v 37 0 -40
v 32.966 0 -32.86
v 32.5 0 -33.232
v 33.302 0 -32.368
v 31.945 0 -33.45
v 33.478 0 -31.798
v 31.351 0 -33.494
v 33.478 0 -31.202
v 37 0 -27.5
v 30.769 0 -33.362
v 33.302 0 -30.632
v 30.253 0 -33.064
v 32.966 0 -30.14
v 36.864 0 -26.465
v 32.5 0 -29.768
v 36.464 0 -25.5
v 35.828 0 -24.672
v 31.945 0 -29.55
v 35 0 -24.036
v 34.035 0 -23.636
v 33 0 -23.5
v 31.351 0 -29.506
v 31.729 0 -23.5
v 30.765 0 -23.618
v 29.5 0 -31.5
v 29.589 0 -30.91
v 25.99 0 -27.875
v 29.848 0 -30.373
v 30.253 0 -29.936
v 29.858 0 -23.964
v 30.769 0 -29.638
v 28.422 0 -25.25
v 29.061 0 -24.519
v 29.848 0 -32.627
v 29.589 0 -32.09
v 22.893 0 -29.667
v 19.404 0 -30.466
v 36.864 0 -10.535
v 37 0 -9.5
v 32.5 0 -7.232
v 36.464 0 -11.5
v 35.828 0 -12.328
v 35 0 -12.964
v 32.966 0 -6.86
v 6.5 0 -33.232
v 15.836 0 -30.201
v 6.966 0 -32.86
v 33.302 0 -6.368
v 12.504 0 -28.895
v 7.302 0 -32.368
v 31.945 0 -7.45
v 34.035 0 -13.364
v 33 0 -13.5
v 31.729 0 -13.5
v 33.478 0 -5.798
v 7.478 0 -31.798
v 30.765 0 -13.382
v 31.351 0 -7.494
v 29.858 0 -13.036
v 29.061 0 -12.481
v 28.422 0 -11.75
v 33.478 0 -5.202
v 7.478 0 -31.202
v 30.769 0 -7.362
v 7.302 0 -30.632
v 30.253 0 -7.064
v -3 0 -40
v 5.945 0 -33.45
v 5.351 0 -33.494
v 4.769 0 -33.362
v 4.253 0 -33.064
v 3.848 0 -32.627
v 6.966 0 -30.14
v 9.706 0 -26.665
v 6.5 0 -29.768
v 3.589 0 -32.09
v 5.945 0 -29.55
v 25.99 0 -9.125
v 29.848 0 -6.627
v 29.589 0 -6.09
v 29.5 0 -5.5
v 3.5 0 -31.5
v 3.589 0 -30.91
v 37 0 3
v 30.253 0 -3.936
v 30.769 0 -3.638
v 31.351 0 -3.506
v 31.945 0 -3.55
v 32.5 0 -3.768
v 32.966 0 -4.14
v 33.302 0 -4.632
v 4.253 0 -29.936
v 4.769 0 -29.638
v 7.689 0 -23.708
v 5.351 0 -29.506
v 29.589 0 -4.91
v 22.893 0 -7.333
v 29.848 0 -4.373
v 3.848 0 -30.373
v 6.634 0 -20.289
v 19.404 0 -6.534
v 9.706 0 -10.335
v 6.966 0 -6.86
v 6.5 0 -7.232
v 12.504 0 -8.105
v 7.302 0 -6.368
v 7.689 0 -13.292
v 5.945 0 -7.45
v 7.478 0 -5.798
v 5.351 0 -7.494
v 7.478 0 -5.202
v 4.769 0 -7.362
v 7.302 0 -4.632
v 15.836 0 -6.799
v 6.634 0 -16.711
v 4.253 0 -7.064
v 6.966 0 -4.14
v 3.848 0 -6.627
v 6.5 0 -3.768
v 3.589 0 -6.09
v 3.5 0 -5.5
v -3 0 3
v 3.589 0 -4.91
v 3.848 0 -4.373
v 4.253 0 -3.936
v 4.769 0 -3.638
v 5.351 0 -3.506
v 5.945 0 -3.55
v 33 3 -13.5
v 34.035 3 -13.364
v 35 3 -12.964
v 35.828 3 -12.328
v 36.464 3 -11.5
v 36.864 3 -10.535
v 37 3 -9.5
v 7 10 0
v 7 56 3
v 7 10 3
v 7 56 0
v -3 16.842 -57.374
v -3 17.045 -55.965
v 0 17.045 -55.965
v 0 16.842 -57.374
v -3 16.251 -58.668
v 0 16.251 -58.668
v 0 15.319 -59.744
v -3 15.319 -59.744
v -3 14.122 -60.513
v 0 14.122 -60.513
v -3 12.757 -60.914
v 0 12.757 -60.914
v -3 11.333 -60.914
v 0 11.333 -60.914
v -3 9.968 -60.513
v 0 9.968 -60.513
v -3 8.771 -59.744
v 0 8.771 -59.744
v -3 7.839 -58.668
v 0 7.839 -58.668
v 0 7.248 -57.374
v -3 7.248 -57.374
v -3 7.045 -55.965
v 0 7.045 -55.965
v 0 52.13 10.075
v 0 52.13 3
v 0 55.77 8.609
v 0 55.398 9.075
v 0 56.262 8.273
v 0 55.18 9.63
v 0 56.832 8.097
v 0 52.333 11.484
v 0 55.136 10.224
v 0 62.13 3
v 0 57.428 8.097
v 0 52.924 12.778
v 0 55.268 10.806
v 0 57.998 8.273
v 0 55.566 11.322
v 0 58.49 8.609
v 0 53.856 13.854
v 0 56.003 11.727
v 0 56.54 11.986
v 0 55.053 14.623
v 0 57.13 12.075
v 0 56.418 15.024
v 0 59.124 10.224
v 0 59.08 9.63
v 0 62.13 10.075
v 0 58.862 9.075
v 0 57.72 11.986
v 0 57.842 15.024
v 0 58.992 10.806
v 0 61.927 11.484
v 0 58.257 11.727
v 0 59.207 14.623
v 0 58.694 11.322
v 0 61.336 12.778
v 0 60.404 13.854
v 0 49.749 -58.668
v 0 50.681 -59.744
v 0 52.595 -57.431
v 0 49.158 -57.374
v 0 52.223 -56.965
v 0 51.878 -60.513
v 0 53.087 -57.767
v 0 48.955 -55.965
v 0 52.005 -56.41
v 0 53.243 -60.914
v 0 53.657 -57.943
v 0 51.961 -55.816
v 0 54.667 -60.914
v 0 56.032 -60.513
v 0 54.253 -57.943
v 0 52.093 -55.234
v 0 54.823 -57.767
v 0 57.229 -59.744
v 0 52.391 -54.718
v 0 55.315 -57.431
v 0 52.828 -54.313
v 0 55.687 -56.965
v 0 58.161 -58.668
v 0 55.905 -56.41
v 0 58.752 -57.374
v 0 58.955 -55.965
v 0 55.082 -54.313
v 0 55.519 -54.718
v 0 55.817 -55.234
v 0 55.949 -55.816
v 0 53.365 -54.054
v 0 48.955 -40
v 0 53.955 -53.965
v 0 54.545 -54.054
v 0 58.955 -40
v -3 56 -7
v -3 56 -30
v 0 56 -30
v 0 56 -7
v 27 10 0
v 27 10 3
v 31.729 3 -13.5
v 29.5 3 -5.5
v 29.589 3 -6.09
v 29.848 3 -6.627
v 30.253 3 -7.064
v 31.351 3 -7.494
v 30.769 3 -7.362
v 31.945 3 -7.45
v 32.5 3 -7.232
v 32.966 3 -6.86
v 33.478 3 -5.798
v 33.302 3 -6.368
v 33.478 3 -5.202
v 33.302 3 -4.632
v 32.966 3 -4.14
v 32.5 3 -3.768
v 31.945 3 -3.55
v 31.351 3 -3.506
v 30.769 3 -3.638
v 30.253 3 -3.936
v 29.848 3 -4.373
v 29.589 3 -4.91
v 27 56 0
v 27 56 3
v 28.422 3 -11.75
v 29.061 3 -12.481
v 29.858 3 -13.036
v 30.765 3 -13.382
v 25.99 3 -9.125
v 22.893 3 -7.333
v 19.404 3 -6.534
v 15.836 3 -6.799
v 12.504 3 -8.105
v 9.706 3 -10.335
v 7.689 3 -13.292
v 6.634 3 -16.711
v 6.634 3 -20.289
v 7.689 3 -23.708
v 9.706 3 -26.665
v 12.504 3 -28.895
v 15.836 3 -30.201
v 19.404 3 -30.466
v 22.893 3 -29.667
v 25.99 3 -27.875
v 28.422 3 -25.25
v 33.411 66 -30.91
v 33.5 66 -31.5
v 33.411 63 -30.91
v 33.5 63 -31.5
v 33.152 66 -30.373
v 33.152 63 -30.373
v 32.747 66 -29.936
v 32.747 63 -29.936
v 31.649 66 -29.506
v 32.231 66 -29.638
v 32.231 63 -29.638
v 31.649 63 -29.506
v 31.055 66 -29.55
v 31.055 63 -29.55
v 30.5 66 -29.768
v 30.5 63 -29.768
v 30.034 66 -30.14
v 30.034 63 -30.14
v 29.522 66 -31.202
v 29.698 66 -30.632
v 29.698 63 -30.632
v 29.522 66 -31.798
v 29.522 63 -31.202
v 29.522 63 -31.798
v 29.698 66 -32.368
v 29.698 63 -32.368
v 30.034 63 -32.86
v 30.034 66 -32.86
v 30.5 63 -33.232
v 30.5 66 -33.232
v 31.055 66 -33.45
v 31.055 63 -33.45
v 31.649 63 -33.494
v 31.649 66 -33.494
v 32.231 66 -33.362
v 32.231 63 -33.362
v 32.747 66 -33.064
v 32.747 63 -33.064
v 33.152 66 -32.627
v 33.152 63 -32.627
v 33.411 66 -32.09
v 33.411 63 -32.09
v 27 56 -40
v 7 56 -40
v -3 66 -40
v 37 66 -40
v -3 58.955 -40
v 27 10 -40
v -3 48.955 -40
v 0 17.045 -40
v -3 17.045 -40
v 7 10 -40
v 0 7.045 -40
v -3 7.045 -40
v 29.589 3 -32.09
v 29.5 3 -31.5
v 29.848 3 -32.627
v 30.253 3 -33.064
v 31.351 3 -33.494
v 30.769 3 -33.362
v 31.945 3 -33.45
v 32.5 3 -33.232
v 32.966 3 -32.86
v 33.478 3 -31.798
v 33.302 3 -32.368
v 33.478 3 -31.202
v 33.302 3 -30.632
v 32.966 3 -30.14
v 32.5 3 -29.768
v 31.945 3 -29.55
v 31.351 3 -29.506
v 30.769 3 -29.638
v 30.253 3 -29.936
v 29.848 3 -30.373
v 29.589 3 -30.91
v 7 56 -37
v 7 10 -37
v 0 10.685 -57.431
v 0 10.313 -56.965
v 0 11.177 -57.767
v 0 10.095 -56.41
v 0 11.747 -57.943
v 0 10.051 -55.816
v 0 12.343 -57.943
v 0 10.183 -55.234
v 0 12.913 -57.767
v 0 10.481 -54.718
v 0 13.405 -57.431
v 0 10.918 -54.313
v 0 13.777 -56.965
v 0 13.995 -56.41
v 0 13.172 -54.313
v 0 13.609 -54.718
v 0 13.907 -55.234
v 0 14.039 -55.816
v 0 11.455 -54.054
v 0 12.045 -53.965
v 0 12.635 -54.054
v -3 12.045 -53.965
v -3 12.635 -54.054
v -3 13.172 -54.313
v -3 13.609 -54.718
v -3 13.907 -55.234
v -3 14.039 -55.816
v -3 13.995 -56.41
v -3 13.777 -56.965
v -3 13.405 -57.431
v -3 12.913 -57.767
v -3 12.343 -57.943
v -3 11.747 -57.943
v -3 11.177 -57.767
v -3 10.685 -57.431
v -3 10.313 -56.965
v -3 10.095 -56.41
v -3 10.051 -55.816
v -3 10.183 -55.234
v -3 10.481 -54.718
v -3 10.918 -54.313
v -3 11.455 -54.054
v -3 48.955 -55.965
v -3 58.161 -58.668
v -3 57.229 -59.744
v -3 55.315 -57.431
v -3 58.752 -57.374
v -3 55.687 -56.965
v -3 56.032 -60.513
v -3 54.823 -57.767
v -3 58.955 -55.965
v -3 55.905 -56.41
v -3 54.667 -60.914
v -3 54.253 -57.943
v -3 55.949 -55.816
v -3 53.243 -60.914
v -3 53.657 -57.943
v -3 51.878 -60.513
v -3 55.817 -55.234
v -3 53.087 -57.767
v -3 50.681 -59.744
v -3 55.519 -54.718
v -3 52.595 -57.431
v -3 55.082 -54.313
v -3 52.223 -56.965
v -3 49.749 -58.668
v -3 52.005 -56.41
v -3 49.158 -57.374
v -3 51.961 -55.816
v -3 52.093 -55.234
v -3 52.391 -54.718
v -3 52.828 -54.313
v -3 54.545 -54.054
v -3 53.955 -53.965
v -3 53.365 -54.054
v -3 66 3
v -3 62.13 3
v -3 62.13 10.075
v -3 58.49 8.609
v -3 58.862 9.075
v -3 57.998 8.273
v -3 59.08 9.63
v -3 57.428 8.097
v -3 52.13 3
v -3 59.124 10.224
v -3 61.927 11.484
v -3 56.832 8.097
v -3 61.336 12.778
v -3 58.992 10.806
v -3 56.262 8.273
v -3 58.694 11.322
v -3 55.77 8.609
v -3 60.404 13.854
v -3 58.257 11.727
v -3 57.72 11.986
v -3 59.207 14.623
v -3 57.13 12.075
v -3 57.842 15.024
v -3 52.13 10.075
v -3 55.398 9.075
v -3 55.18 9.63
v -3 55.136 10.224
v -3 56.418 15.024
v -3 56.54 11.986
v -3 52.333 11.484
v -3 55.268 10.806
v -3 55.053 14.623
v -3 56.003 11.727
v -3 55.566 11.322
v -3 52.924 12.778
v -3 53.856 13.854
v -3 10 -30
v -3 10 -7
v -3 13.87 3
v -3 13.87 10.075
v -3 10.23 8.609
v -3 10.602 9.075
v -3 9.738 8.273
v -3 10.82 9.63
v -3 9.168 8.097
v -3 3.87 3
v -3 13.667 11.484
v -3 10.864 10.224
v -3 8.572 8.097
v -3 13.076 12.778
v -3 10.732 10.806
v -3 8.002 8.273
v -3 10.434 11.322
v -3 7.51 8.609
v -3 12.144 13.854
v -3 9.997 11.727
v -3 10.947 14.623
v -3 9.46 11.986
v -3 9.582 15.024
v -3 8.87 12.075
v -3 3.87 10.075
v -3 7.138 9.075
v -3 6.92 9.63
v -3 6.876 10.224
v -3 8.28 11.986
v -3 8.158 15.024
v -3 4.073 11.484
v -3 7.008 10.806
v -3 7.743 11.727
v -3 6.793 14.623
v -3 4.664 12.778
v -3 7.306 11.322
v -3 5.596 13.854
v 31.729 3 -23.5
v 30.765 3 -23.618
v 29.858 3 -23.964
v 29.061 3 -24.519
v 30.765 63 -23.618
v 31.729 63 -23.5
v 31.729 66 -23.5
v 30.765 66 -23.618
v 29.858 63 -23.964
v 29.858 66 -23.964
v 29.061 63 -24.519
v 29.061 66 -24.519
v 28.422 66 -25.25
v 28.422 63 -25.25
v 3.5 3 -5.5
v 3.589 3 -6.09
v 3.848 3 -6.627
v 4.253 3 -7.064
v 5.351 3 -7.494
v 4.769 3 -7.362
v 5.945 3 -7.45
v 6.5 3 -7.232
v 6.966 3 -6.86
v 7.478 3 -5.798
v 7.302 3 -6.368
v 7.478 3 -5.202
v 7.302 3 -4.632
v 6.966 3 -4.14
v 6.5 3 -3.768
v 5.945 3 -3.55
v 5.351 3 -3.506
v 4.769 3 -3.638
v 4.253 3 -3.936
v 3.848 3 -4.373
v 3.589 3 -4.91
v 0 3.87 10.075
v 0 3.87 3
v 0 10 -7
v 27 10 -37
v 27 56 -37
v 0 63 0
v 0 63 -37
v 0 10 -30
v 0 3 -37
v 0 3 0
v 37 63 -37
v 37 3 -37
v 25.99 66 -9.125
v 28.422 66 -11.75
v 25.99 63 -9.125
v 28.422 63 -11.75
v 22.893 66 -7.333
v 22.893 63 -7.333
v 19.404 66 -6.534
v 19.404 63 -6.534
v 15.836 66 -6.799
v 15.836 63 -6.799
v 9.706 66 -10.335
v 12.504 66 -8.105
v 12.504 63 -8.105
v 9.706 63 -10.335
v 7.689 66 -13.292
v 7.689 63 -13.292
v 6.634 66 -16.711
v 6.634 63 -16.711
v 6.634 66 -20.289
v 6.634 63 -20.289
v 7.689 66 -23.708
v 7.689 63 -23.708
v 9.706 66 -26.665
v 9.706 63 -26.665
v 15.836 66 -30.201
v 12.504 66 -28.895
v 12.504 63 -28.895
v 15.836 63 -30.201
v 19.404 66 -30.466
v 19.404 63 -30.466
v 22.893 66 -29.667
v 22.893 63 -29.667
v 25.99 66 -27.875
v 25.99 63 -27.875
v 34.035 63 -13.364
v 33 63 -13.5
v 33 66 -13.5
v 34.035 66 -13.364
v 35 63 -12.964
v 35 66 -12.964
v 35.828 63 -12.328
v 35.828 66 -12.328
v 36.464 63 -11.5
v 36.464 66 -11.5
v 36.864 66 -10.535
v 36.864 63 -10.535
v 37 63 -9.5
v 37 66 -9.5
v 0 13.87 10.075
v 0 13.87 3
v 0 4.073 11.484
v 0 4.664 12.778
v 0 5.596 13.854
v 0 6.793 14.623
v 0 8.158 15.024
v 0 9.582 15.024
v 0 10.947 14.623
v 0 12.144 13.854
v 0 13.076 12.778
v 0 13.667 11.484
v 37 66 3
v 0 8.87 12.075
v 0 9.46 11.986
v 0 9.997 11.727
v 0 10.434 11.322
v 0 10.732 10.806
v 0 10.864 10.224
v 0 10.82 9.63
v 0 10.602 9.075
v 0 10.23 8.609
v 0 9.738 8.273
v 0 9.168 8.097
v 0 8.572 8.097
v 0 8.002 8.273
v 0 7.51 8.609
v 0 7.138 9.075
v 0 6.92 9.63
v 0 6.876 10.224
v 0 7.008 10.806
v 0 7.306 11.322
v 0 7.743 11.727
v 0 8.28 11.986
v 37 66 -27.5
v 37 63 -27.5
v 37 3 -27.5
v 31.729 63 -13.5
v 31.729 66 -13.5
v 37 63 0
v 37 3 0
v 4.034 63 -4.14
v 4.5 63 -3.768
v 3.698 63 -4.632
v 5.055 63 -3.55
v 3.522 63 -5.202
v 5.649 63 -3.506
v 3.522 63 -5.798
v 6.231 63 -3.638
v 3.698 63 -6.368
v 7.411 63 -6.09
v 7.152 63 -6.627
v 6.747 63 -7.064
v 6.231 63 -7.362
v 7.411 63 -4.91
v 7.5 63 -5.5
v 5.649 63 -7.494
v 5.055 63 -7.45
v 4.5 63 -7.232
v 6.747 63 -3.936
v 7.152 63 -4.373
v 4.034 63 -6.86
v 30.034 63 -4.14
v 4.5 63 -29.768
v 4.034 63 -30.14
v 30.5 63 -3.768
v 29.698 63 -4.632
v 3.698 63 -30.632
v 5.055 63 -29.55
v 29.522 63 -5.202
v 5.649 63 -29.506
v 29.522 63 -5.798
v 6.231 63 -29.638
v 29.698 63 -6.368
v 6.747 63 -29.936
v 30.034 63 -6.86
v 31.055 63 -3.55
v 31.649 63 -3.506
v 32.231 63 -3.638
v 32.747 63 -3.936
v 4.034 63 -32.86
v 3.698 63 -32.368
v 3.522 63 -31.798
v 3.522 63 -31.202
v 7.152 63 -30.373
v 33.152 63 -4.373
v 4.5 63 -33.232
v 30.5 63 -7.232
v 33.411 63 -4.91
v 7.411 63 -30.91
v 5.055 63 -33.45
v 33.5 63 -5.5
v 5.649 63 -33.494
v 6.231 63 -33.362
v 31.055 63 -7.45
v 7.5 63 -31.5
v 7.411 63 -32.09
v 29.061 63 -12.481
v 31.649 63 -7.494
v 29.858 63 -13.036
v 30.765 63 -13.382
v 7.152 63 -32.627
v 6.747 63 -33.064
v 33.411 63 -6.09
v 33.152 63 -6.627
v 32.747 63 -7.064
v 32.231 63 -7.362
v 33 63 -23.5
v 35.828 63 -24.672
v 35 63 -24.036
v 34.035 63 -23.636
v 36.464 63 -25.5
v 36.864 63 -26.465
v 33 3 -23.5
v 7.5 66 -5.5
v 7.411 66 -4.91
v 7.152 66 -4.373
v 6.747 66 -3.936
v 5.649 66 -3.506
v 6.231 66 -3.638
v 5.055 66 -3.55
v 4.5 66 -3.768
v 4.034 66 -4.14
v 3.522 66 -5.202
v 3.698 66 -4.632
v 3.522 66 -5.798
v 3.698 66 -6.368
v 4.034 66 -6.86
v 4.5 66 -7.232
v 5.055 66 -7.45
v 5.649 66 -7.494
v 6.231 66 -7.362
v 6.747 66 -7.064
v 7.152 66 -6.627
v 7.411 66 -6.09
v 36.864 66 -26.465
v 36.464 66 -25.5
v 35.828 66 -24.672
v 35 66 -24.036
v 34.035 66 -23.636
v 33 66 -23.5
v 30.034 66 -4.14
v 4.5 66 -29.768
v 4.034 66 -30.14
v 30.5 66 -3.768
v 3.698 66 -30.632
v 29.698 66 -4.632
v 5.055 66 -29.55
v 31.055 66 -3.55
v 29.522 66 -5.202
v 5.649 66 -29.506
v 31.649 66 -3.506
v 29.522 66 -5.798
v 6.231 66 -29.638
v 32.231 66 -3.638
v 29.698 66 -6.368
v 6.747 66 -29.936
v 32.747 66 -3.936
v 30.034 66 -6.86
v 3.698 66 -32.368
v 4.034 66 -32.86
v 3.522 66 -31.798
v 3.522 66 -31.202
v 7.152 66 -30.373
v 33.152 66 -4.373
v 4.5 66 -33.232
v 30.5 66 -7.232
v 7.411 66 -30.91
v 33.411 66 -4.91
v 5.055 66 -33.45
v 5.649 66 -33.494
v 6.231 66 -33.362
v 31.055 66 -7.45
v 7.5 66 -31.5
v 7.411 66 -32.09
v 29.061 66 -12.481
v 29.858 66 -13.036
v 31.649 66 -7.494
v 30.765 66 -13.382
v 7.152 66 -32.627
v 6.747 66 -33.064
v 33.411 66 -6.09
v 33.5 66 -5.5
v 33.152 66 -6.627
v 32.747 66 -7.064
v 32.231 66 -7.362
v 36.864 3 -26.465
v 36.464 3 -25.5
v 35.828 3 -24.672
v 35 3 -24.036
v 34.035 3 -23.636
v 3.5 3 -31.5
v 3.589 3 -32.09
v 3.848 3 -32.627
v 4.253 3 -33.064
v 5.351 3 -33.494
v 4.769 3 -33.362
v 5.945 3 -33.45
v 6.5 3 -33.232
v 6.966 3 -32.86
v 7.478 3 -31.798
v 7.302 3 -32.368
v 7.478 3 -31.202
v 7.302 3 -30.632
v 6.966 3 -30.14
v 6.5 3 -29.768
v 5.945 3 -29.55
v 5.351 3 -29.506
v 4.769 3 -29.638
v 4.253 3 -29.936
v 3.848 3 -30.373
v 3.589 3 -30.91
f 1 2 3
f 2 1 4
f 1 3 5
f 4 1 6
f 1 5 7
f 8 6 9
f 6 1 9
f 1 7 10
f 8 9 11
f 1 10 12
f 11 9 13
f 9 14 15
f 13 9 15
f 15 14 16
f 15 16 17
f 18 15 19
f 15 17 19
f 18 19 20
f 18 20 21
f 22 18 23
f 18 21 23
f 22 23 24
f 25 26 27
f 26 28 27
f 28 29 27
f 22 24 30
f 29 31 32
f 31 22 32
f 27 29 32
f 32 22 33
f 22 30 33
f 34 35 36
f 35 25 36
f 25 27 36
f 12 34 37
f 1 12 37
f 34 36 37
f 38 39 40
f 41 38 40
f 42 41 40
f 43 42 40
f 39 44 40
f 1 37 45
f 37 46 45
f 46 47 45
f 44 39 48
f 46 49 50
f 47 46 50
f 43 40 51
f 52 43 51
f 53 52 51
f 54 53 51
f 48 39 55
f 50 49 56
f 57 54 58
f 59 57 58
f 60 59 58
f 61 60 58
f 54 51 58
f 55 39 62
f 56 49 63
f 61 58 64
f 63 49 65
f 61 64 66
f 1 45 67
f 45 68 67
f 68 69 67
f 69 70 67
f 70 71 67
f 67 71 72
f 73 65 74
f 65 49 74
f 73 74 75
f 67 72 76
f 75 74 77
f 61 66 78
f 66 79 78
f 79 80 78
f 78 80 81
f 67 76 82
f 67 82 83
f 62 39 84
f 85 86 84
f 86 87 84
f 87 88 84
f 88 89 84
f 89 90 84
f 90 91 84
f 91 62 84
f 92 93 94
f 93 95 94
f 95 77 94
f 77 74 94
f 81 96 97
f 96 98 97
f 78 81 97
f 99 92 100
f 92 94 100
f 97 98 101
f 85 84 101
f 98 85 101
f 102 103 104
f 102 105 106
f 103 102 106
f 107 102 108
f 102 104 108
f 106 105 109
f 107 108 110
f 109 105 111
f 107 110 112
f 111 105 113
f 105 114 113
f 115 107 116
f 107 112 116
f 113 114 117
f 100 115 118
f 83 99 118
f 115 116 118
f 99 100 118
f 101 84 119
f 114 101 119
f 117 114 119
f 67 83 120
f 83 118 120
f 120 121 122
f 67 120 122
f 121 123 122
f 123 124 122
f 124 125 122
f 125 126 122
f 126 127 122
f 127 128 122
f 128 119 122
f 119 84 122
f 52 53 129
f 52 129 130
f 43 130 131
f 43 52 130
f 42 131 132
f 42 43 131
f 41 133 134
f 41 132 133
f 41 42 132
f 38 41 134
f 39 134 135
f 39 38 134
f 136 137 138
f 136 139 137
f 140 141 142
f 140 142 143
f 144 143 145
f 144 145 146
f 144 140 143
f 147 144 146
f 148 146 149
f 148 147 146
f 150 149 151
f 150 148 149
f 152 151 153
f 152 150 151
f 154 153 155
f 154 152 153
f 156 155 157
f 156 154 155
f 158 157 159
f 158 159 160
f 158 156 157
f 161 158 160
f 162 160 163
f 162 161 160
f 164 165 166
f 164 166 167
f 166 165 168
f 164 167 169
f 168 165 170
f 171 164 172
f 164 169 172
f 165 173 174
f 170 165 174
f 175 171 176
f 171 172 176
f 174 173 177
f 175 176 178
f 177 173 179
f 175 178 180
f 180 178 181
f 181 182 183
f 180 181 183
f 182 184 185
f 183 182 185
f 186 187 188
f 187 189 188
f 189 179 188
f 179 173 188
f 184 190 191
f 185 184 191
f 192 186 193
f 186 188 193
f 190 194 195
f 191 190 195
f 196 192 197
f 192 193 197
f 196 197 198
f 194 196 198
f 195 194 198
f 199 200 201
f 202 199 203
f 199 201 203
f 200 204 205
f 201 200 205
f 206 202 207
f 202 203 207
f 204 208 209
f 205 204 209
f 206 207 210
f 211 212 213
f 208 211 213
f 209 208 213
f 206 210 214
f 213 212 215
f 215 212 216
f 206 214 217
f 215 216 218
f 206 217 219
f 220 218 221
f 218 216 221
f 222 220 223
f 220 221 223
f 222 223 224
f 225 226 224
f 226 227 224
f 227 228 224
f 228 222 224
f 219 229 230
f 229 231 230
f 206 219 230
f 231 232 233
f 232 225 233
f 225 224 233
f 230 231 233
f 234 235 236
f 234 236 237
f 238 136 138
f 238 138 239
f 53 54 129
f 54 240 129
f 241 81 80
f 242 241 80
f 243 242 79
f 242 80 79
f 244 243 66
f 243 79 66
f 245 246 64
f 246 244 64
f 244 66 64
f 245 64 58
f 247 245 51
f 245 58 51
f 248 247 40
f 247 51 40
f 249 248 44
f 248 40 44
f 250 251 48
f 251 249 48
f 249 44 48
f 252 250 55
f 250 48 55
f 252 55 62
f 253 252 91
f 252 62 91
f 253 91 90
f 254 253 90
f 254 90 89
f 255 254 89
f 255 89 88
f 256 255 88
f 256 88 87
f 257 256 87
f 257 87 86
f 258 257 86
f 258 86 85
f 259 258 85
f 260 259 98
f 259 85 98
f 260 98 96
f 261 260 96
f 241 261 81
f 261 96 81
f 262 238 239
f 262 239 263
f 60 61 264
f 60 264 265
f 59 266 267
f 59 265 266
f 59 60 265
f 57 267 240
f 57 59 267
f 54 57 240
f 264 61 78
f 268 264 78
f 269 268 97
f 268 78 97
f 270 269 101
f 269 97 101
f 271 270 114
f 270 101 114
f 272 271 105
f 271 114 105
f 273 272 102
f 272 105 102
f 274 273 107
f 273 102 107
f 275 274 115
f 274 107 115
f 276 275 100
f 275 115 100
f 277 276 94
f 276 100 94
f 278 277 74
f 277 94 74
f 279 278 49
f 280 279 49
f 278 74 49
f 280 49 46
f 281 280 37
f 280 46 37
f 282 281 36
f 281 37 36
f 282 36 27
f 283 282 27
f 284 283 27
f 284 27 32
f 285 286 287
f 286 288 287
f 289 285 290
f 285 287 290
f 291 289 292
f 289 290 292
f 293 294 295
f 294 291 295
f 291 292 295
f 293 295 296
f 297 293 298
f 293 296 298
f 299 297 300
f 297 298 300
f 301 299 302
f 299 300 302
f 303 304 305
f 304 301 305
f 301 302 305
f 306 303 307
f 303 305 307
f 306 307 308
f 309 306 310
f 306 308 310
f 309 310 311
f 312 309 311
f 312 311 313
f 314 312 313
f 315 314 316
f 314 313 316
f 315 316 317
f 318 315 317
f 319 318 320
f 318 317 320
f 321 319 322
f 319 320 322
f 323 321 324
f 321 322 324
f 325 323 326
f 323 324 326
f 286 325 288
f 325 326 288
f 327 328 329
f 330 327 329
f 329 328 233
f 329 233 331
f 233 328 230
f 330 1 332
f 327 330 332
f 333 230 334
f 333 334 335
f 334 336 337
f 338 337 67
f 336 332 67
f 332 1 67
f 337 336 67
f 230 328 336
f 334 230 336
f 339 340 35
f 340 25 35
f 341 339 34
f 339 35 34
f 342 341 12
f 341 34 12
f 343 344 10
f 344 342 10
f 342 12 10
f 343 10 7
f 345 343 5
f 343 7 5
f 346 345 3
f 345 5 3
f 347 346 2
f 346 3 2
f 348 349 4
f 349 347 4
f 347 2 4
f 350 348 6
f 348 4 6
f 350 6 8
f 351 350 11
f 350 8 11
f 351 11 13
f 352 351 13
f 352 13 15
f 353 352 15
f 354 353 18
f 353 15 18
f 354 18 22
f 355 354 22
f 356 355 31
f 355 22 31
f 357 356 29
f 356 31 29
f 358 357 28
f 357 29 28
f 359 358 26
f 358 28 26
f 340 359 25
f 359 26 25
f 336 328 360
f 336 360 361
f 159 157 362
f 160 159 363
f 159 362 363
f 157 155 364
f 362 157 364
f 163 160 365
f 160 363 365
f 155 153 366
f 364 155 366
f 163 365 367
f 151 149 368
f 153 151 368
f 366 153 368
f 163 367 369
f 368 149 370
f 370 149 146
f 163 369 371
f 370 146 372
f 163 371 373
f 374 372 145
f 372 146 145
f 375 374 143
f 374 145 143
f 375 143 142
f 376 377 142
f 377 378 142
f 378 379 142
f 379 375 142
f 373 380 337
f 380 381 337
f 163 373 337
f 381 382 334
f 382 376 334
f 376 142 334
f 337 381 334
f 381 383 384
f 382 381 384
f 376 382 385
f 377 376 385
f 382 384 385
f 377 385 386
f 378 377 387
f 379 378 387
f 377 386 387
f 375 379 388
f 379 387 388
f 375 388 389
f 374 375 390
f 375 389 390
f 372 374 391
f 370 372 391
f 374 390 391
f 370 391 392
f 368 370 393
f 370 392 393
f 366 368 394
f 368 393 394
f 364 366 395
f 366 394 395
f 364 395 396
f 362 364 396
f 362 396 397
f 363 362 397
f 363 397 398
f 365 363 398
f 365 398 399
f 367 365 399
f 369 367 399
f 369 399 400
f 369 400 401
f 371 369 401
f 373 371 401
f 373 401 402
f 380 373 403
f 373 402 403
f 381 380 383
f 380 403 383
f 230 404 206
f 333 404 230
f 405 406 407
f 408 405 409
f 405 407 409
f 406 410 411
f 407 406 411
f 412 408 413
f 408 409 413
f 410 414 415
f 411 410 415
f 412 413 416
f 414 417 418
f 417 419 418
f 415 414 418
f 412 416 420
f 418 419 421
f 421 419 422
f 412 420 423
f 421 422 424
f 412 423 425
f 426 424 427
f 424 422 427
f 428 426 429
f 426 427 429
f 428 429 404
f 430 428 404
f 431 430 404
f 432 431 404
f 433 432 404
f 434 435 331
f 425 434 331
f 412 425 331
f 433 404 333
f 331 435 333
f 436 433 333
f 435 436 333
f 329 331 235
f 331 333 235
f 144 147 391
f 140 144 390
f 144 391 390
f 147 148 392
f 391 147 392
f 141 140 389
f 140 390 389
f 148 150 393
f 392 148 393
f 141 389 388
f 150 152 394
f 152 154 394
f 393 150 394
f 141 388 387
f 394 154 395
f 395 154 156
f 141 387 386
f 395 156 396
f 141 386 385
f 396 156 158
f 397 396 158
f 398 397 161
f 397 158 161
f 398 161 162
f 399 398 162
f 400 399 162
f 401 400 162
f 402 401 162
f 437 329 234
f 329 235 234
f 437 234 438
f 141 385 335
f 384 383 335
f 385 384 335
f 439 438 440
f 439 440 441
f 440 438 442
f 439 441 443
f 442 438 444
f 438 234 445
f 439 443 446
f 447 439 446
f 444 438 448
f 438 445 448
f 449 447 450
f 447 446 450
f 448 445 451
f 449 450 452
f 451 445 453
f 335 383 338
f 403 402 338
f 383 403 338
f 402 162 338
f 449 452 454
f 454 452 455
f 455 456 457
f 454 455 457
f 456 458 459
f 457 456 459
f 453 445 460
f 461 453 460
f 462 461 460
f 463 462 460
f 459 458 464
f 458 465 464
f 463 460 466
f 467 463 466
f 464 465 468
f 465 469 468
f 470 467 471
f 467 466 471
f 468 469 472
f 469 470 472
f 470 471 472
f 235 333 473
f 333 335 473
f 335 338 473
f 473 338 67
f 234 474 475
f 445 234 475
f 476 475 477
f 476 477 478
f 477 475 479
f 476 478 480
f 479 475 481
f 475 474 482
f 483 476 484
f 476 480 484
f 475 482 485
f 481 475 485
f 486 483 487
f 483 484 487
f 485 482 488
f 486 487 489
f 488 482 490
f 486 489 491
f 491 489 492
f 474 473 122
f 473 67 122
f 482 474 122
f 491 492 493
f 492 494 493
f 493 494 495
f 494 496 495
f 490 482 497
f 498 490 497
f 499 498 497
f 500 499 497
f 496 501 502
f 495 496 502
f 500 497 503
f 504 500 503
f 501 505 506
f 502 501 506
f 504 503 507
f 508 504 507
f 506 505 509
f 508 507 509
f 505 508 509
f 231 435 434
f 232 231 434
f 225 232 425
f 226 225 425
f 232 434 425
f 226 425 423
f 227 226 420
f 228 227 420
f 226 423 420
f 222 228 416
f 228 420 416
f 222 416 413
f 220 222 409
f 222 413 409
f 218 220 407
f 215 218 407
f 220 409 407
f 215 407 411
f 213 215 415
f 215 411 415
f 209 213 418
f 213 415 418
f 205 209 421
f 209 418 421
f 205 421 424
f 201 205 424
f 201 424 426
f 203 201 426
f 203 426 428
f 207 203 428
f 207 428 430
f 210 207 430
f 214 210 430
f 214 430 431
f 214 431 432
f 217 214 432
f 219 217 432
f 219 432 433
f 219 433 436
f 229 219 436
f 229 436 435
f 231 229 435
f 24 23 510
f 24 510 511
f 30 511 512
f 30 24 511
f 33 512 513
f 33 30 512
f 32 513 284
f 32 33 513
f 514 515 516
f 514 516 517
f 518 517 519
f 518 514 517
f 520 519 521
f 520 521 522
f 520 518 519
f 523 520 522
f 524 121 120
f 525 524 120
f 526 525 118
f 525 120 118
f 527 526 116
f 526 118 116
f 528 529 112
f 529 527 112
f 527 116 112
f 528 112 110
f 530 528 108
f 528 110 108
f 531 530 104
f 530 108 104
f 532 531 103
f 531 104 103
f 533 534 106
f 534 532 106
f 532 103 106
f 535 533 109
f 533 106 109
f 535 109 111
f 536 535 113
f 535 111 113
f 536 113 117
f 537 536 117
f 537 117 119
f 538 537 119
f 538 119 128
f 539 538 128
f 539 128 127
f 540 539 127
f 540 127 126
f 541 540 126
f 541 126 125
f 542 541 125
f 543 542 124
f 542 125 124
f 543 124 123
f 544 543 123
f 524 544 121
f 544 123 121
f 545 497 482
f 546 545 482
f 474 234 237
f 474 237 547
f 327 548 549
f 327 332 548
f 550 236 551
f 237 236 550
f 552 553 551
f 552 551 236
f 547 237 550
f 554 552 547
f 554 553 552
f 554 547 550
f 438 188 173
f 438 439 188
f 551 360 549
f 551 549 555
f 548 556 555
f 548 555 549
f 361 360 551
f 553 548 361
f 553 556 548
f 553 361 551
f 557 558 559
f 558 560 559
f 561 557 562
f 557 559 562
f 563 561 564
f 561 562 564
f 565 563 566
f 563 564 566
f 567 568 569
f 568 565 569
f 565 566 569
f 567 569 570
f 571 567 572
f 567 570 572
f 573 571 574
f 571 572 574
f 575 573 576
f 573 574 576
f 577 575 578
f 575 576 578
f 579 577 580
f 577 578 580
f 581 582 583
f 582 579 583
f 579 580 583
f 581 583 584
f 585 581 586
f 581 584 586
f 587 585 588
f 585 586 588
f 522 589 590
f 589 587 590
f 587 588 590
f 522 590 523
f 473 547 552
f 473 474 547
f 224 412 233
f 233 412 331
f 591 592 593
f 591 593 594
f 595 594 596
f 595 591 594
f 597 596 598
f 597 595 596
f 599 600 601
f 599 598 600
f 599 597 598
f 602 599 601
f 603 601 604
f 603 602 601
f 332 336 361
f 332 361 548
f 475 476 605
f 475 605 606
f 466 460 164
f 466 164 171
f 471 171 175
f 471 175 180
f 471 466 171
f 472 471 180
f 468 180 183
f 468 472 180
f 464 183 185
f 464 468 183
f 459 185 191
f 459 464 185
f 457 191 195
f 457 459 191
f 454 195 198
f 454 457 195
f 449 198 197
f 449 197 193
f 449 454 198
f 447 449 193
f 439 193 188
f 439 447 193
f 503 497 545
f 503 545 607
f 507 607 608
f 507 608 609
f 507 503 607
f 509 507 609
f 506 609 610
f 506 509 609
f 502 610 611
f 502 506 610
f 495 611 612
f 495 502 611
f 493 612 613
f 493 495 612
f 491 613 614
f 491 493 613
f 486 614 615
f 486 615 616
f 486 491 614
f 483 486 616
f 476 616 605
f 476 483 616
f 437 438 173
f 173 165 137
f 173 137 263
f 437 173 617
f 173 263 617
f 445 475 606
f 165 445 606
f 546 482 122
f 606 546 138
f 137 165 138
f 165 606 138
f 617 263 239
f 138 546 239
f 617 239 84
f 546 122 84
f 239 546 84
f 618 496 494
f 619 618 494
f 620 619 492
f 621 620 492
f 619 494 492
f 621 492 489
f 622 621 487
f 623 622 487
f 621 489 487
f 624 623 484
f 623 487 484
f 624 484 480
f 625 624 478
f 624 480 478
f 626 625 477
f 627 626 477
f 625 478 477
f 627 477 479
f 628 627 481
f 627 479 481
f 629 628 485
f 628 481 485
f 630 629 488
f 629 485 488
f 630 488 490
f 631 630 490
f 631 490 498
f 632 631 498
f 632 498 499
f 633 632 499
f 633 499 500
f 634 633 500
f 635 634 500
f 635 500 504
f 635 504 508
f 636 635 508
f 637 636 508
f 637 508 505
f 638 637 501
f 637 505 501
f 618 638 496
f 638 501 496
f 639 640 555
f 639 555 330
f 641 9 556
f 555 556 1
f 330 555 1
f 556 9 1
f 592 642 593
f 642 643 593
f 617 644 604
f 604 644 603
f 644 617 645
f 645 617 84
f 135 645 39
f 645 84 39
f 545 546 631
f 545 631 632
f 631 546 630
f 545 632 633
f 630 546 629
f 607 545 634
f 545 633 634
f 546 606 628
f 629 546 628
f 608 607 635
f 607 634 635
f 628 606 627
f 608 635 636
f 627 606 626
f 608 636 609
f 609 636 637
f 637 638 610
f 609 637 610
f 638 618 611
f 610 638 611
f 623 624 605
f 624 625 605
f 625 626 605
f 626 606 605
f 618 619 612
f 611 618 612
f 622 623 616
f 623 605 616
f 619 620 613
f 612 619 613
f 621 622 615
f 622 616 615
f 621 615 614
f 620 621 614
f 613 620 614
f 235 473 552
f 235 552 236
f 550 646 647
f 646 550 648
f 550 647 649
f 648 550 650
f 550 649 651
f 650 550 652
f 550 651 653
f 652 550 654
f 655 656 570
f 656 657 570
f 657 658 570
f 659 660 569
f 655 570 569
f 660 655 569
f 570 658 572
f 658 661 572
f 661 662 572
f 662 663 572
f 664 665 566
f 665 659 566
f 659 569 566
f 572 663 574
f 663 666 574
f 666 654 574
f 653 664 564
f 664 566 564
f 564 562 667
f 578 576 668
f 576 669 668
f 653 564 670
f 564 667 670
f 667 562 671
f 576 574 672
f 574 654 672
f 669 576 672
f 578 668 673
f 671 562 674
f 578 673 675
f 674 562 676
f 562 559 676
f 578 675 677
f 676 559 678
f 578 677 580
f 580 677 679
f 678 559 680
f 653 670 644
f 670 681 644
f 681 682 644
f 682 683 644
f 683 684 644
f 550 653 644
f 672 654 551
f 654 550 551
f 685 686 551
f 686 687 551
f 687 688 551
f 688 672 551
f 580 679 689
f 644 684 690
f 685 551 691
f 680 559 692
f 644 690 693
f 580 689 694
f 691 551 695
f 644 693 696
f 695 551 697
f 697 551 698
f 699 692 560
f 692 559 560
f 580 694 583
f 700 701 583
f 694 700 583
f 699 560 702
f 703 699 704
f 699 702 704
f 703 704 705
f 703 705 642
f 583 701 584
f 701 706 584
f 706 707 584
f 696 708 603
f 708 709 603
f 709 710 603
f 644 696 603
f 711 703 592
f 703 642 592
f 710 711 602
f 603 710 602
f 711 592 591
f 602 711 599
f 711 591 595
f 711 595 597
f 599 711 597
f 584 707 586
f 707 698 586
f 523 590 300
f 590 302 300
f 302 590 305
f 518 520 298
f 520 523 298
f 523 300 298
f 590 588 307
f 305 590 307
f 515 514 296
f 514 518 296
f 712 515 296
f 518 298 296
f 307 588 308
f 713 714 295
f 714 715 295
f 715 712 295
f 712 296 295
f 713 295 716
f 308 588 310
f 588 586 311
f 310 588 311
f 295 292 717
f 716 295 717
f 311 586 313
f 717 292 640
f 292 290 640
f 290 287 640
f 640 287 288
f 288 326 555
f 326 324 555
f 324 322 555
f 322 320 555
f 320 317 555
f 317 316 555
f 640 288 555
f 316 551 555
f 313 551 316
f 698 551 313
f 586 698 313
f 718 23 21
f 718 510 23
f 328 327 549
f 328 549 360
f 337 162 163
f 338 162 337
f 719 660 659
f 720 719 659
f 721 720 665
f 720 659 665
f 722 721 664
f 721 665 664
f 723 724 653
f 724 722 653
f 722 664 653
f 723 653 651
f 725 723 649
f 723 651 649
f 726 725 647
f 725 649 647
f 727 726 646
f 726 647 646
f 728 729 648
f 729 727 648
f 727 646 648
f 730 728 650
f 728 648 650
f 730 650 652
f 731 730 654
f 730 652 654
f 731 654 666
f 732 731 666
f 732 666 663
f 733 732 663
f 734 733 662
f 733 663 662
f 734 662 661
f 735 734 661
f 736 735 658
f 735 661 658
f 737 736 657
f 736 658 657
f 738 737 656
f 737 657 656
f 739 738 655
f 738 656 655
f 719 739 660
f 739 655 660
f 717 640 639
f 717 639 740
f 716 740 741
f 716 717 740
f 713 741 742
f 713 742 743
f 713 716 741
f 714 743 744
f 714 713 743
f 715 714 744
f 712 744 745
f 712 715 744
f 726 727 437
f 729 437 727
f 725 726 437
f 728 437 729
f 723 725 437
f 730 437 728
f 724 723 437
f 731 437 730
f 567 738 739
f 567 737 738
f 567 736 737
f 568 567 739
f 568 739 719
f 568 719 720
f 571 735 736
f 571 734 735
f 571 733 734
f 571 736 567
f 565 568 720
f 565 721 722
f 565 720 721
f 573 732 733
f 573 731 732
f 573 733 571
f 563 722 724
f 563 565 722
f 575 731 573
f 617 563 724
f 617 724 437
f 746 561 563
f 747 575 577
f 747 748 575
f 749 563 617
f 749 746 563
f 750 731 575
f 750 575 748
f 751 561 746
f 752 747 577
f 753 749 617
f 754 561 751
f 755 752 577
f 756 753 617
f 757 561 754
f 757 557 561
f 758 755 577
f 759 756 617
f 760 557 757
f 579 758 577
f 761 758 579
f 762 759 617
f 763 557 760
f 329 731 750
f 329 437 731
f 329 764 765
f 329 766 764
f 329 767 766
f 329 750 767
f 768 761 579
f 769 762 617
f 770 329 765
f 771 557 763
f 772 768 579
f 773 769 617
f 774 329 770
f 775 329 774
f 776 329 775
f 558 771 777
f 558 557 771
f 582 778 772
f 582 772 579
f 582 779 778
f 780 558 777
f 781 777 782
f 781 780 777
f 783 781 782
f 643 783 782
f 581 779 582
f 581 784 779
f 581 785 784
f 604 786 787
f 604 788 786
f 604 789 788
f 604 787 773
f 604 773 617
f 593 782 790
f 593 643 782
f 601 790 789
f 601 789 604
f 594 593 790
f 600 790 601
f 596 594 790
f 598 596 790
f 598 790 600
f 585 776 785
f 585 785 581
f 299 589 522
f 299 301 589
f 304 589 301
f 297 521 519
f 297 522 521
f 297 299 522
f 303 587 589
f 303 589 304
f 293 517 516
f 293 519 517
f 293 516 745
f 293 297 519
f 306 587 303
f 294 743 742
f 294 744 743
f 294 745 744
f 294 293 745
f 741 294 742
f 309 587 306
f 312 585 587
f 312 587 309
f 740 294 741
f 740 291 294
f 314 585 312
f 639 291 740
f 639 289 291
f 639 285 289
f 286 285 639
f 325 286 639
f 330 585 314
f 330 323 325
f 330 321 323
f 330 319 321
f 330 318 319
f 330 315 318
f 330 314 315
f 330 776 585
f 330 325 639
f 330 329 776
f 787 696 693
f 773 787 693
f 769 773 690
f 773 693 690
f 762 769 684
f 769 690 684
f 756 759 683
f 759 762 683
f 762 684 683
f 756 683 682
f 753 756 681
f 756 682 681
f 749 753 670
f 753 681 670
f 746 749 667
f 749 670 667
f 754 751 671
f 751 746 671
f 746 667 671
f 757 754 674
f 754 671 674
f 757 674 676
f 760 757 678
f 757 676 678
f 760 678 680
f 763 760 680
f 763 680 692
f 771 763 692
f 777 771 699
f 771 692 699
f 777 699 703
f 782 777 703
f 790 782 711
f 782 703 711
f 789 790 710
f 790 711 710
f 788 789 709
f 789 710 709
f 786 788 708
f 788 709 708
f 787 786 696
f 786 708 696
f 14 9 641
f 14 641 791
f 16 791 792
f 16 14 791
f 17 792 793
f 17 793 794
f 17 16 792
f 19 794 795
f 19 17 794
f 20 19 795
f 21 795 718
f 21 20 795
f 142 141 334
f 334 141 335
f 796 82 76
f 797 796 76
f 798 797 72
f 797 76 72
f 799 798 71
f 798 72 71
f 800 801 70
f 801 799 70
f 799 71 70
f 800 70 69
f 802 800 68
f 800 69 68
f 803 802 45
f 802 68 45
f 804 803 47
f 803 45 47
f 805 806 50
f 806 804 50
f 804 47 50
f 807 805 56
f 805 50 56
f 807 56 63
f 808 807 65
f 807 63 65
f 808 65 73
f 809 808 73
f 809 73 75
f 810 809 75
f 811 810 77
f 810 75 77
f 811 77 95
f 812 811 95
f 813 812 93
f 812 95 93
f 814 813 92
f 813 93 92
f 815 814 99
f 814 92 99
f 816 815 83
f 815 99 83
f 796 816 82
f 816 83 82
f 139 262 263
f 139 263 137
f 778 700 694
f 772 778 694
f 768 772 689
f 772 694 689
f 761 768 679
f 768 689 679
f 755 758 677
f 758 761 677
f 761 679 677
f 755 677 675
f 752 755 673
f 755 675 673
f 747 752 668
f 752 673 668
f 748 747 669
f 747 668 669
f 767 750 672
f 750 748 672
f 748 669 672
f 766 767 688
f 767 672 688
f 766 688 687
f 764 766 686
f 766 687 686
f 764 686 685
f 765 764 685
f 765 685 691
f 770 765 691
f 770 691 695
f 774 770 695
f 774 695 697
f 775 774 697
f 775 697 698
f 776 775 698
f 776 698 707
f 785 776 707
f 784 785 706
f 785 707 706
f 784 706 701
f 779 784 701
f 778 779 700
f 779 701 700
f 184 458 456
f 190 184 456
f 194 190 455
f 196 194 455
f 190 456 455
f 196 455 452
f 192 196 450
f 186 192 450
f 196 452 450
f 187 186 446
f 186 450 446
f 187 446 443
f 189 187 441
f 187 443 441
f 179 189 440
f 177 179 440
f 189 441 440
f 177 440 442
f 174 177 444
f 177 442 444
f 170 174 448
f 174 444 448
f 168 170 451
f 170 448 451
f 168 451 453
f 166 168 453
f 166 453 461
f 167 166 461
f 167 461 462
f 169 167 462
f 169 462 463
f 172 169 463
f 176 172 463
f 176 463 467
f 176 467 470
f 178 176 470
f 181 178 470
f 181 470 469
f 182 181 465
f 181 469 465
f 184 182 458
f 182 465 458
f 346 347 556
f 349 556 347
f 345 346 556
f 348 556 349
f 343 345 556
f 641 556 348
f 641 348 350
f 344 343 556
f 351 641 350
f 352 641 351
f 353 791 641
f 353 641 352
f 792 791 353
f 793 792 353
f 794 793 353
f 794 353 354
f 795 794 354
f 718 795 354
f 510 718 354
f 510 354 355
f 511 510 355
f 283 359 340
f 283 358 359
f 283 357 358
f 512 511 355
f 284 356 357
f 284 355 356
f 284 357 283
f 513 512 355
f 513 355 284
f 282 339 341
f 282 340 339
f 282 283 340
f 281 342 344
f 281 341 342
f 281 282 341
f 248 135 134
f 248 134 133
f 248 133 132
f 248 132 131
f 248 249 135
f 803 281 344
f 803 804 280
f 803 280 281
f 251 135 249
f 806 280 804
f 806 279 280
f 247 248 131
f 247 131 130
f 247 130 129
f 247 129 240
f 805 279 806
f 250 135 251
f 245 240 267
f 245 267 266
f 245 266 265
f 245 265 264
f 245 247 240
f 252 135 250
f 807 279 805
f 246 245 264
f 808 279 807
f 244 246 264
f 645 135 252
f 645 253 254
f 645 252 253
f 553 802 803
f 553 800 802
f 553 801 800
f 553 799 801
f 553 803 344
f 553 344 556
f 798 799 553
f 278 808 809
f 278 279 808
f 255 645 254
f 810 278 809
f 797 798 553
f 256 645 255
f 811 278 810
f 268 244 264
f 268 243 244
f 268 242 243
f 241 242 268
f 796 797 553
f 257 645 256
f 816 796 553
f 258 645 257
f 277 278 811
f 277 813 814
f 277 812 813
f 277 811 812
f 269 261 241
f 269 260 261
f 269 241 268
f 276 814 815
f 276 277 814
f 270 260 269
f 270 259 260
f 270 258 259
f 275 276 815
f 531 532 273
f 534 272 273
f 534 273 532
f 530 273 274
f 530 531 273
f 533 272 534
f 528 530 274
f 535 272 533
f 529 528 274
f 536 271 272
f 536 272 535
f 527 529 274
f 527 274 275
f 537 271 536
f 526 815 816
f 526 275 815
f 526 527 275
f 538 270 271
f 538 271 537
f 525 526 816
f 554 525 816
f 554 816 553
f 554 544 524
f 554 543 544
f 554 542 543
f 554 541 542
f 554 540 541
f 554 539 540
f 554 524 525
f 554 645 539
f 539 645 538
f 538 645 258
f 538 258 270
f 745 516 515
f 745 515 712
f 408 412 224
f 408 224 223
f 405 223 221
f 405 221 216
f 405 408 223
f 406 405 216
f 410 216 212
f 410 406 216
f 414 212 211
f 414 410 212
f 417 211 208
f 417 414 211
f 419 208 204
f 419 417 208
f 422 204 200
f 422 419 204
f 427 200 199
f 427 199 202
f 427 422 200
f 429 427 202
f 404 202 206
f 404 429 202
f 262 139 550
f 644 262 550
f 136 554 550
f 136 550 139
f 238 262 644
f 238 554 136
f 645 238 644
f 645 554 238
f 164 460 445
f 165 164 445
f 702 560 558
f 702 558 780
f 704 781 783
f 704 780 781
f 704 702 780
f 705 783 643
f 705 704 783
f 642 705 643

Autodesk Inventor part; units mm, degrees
ref_plane "YZ Plane" through (0, 0, 0) normal (1, 0, 0) x (0, 1, 0)
ref_plane "XZ Plane" through (0, 0, 0) normal (0, 1, 0) x (-1, 0, 0)
ref_plane "XY Plane" through (0, 0, 0) normal (0, 0, 1) x (1, 0, 0)
sketch "Sketch1" plane through (0, 0, 0) normal (0, 1, 0) x (-1, 0, 0)
  line L0 (0, 0) -> (-37, 0)
  line L1 (-37, 0) -> (-37, -37)
  line L2 (-37, -37) -> (0, -37)
  line L3 (0, -37) -> (0, 0)
  circle A0 centre (-5.5, -5.5) radius 2
  circle A1 centre (-5.5, -31.5) radius 2
  circle A2 centre (-31.5, -5.5) radius 2
  circle A3 centre (-31.5, -31.5) radius 2
  circle A4 centre (-18.5, -18.5) radius 12
  dimension "d10" = 24
extrude "Extrusion1" add sketch "Sketch1" along normal blind 3
sketch "Sketch2" plane through (0, 3, 0) normal (0, 1, 0) x (1, 0, 0)
  circle A0 centre (18.5, 18.5) radius 12
  circle A1 centre (31.5, 31.5) radius 2
  circle A2 centre (31.5, 5.5) radius 2
  circle A3 centre (5.5, 31.5) radius 2
  circle A4 centre (5.5, 5.5) radius 2
  line L0 (0, 0) -> (37, 0)
  line L1 (37, 37) -> (0, 37)
  line L2 (0, 37) -> (0, 0)
  line L3 (-3, -3) -> (37, -3)
  line L4 (37, 40) -> (-3, 40)
  line L5 (-3, 40) -> (-3, -3)
  line L6 (37, -3) -> (37, 0)
  line L7 (37, 37) -> (37, 40)
  dimension "d13" = 3
extrude "Extrusion2" add sketch "Sketch2" along normal blind 60 and the other way blind 3 contours L0 L6 L3 L5 L4 L7 L1 L2
sketch "Sketch4" plane through (0, 63, 0) normal (0, 1, 0) x (1, 0, 0)
  circle A0 centre (18.5, 18.5) radius 12 projected
  circle A1 centre (31.5, 31.5) radius 2 projected
  circle A2 centre (31.5, 5.5) radius 2 projected
  circle A3 centre (5.5, 31.5) radius 2 projected
  circle A4 centre (5.5, 5.5) radius 2 projected
  line L0 (0, 0) -> (37, 0) projected
  line L1 (37, 0) -> (37, 37) projected
  line L2 (37, 37) -> (0, 37) projected
  line L3 (0, 37) -> (0, 0) projected
  line L4 (37, 0) -> (0, 0) projected
  line L5 (0, 0) -> (0, 37) projected
  line L6 (0, 37) -> (37, 37) projected
  line L7 (37, 37) -> (37, 40) projected
  line L8 (37, 40) -> (-3, 40) projected
  line L9 (-3, 40) -> (-3, -3) projected
  line L10 (-3, -3) -> (37, -3) projected
  line L11 (37, -3) -> (37, 0) projected
extrude "Extrusion3" add sketch "Sketch4" along normal blind 3
sketch "Sketch5" plane through (0, 66, 0) normal (0, 1, 0) x (1, 0, 0)
  arc A0 (29.4087, 13.5) -> (29.4087, 23.5) centre (18.5, 18.5) ccw
  circle A1 centre (5.5, 5.5) radius 2
  circle A2 centre (5.5, 31.5) radius 2
  circle A3 centre (31.5, 5.5) radius 2
  circle A4 centre (31.5, 31.5) radius 2
  line L0 (37, 13.5) -> (37, 23.5)
  line L1 (37, 40) -> (-3, 40)
  line L2 (-3, 40) -> (-3, -3)
  line L3 (-3, -3) -> (37, -3)
  arc A5 (29.4087, 13.5) -> (29.4087, 23.5) centre (18.5, 18.5) ccw
  line L4 (37, 23.5) -> (37, 13.5)
  line L5 (29.4087, 23.5) -> (37, 23.5)
  line L6 (29.4087, 13.5) -> (37, 13.5)
  point P0 (0, 0)
extrude "Extrusion4" cut sketch "Sketch5" against normal up to surface (66 mm away) contours A0 L5 L0 L6
fillet "Fillet1" radius 4 8 edges at (29.4087, 64.5, -13.5) (37, 64.5, -13.5) (37, 64.5, -23.5) (29.4087, 64.5, -23.5) (37, 1.5, -13.5) (29.4087, 1.5, -13.5) (37, 1.5, -23.5) (29.4087, 1.5, -23.5)
sketch "Sketch7" plane through (37, 0, -40) normal (0, 0, -1) x (-1, 0, 0)
  line L0 (40, 66) -> (40, 0) projected
  line L1 (0, 66) -> (40, 66) projected
  line L2 (0, 66) -> (0, 0) projected
  line L3 (40, 0) -> (0, 0) projected
  line L4 (30, 56) -> (30, 10)
  line L5 (30, 10) -> (10, 10)
  line L6 (10, 10) -> (10, 56)
  line L7 (10, 56) -> (30, 56)
  point P0 (37, 0)
  dimension "d26" = 10
extrude "Extrusion5" cut sketch "Sketch7" against normal up to surface (43 mm away) contours L4 L5 L6 L7
sketch "Sketch8" plane through (-3, 0, -40) normal (-1, 0, 0) x (0, 0, 1)
  line L0 (43, 66) -> (43, 0) projected
  line L1 (0, 66) -> (43, 66) projected
  line L2 (0, 66) -> (0, 0) projected
  line L3 (43, 0) -> (0, 0) projected
  line L4 (33, 56) -> (33, 10)
  line L5 (33, 10) -> (10, 10)
  line L6 (10, 10) -> (10, 56)
  line L7 (10, 56) -> (33, 56)
  point P0 (40, 0)
  dimension "d29" = 10
extrude "Extrusion6" cut sketch "Sketch8" against normal blind 3 contours L4 L5 L6 L7
sketch "Sketch9" plane through (-3, 0, -40) normal (-1, 0, 0) x (0, 0, 1)
  line L0 (10, 56) -> (33, 56)
  line L1 (33, 56) -> (33, 10)
  line L2 (33, 10) -> (10, 10)
  line L3 (10, 10) -> (10, 56)
  line L4 (0, 66) -> (43, 66)
  line L5 (43, 0) -> (0, 0)
  line L6 (0, 66) -> (43, 66) projected
  circle A0 centre (50.075, 8.87) radius 2
  circle A1 centre (-15.965, 12.045) radius 2
  circle A2 centre (50.075, 57.13) radius 2
  circle A3 centre (-15.965, 53.955) radius 2
  arc A4 (50.075, 3.87) -> (50.075, 13.87) centre (50.075, 8.87) ccw
  arc A5 (50.075, 52.13) -> (50.075, 62.13) centre (50.075, 57.13) ccw
  arc A6 (-15.965, 17.045) -> (-15.965, 7.045) centre (-15.965, 12.045) ccw
  arc A7 (-15.965, 58.955) -> (-15.965, 48.955) centre (-15.965, 53.955) ccw
  line L7 (50.075, 3.87) -> (43, 3.87)
  line L8 (50.075, 13.87) -> (43, 13.87)
  line L9 (50.075, 62.13) -> (43, 62.13)
  line L10 (50.075, 52.13) -> (43, 52.13)
  line L11 (-15.965, 7.045) -> (0, 7.045)
  line L12 (-15.965, 17.045) -> (0, 17.045)
  line L13 (-15.965, 48.955) -> (0, 48.955)
  line L14 (0, 56) -> (0, 10) projected
  line L15 (-15.965, 58.955) -> (0, 58.955)
  line L16 (0, 66) -> (0, 0) projected
  line L17 (0, 58.955) -> (0, 48.955)
  line L18 (0, 17.045) -> (0, 7.045)
  line L19 (43, 62.13) -> (43, 52.13)
  line L20 (43, 13.87) -> (43, 3.87)
  point P0 (40, 0)
  dimension "d53" = 10
extrude "Extrusion7" add sketch "Sketch9" against normal blind 3 contours L7 L20 L8 A4 | L10 L19 L9 A5 | L12 L14 L16 L11 A6 | L13 A7 L15 L16 L14
properties part number "14HM11 Chassis"
